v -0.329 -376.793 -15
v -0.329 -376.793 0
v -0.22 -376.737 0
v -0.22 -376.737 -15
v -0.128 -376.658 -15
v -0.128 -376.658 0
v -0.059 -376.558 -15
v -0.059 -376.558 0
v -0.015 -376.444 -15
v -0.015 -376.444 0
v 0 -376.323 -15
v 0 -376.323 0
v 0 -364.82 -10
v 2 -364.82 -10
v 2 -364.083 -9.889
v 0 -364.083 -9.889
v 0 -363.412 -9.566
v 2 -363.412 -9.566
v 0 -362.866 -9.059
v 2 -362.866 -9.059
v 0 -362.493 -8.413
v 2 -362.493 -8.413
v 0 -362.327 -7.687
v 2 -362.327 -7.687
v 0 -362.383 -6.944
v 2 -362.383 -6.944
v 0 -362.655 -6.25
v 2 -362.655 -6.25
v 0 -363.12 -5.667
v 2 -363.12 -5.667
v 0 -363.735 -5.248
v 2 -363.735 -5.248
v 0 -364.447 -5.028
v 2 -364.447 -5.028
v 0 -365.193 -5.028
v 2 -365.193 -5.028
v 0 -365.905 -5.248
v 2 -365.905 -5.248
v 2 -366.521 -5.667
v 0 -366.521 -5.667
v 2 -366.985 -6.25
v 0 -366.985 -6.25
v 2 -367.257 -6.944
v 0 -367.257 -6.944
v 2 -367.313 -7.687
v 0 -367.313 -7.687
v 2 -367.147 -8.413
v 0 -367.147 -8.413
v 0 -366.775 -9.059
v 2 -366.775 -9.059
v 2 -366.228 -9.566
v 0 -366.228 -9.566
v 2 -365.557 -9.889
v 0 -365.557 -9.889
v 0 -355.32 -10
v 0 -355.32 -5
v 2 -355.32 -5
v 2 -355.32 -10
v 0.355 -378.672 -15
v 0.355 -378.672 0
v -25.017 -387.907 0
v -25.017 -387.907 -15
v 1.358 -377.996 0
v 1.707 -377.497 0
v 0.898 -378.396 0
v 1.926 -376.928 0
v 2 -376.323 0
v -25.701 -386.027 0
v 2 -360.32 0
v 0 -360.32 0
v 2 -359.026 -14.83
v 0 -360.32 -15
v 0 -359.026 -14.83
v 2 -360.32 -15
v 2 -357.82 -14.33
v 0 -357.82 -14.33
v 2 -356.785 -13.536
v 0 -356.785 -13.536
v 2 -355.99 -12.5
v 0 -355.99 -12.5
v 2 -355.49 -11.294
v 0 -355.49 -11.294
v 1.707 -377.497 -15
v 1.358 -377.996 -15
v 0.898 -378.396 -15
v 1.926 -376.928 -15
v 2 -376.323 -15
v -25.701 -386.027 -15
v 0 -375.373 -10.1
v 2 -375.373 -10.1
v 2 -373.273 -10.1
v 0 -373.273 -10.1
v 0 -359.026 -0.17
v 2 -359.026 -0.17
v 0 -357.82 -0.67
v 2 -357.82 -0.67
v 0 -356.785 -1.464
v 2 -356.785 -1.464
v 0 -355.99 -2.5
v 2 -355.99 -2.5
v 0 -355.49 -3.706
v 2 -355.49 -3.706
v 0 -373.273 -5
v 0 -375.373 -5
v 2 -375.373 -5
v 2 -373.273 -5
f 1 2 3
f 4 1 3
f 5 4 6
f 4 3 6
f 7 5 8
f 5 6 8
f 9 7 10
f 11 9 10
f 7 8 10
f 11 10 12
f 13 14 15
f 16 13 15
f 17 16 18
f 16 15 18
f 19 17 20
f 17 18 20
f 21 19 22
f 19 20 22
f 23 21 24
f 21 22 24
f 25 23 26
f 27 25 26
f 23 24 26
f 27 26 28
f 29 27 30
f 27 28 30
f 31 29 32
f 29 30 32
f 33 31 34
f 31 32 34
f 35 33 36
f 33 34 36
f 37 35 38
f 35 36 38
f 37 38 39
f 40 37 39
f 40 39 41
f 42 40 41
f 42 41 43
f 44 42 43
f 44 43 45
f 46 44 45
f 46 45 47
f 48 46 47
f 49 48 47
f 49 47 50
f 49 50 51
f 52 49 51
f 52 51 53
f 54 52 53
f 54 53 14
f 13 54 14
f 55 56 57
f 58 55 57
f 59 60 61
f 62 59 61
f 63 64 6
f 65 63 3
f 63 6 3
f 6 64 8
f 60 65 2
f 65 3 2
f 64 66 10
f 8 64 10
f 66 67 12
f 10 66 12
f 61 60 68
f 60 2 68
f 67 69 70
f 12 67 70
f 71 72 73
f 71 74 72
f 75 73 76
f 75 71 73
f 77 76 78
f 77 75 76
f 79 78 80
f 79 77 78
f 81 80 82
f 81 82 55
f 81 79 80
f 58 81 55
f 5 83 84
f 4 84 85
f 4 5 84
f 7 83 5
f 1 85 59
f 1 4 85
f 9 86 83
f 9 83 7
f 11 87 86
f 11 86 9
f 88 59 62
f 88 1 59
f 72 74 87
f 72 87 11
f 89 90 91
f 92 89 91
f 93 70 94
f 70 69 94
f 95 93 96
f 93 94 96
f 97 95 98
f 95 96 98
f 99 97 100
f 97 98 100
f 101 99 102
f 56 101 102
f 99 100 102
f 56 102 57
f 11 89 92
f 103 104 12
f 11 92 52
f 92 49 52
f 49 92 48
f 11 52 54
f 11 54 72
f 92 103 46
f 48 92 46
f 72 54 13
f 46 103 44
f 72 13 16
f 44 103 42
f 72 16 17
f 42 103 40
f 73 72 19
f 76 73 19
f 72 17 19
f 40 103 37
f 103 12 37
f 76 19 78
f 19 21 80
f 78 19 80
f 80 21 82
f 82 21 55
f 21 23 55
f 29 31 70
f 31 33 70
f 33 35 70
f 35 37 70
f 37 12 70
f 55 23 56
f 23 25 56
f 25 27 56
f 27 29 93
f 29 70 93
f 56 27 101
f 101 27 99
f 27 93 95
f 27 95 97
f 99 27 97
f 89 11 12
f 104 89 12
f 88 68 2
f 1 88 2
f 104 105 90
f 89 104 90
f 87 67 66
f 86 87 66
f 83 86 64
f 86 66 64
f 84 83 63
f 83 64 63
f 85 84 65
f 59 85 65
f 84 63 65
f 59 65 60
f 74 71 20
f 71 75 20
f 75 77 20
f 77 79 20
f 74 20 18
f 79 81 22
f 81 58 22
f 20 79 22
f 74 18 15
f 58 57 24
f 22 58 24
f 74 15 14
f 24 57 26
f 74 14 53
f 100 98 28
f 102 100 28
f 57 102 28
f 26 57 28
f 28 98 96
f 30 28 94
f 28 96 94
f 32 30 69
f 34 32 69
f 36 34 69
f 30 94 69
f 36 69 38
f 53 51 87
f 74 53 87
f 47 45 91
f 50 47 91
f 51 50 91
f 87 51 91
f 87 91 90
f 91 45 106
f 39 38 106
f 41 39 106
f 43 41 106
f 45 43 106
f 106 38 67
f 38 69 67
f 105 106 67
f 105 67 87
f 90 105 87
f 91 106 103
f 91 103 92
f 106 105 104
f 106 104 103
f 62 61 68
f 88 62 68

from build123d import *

# Parameters (mm, degrees)
DODANIE_WYCI_GNI_CIE1_DEPTH = 15
SZKIC2_R                    = 2.5
WYTNIJ_WYCI_GNI_CIE3_DEPTH  = 15
SZKIC4_W                    = 5.1
SZKIC4_H                    = 2.1
WYTNIJ_WYCI_GNI_CIE8_DEPTH  = 15
ZAOKR_GLENIE1_R             = 5


with BuildPart() as part:
    # Szkic1 → Dodanie-wyciągnięcie1 (new body)
    with BuildSketch(Plane.XY):
        with BuildLine():
            Line((0.355050358, -378.672211739), (-25.016650403, -387.906755609))
            Line((-25.016650403, -387.906755609), (-25.70069069, -386.027370367))
            Line((-25.70069069, -386.027370367), (-0.328989928, -376.792826498))
            ThreePointArc((-0.328989928, -376.792826498), (-0.090423978, -376.609768405), (0, -376.322980187))
            Line((0, -376.322980187), (0, -375.320100819))
            Line((0, -375.320100819), (0, -373.324775164))
            Line((0, -373.324775164), (0, -360.320100819))
            Line((0, -360.320100819), (0, -355.320100819))
            Line((0, -355.320100819), (2, -355.320100819))
            Line((2, -355.320100819), (2, -360.320100819))
            Line((2, -360.320100819), (2, -375.320100819))
            Line((2, -375.320100819), (2, -376.322980187))
            ThreePointArc((2, -376.322980187), (1.547880111, -377.756921278), (0.355050358, -378.672211739))
        make_face()
    extrude(amount=-DODANIE_WYCI_GNI_CIE1_DEPTH)

    # Szkic2 → Wytnij-wyciągnięcie3 (cut)
    with BuildSketch(Plane(origin=(2, 0, 0), x_dir=(0, 0, -1), z_dir=(1, 0, 0))):
        with Locations((7.5, -364.820100819)):
            Circle(SZKIC2_R)
    extrude(amount=-WYTNIJ_WYCI_GNI_CIE3_DEPTH, mode=Mode.SUBTRACT)

    # Szkic4 → Wytnij-wyciągnięcie8 (cut)
    with BuildSketch(Plane(origin=(2, 0, 0), x_dir=(0, 0, -1), z_dir=(1, 0, 0))):
        with Locations((7.55, -374.322980187)):
            Rectangle(SZKIC4_W, SZKIC4_H)
    extrude(amount=-WYTNIJ_WYCI_GNI_CIE8_DEPTH, mode=Mode.SUBTRACT)

    # Zaokrąglenie1
    zaokr_glenie1_edges = [part.edges().sort_by_distance(p)[0] for p in [
        (1, -355.320100819, -15),
        (1, -355.320100819, 0),
    ]]
    fillet(zaokr_glenie1_edges, radius=ZAOKR_GLENIE1_R)


solid = part.part
